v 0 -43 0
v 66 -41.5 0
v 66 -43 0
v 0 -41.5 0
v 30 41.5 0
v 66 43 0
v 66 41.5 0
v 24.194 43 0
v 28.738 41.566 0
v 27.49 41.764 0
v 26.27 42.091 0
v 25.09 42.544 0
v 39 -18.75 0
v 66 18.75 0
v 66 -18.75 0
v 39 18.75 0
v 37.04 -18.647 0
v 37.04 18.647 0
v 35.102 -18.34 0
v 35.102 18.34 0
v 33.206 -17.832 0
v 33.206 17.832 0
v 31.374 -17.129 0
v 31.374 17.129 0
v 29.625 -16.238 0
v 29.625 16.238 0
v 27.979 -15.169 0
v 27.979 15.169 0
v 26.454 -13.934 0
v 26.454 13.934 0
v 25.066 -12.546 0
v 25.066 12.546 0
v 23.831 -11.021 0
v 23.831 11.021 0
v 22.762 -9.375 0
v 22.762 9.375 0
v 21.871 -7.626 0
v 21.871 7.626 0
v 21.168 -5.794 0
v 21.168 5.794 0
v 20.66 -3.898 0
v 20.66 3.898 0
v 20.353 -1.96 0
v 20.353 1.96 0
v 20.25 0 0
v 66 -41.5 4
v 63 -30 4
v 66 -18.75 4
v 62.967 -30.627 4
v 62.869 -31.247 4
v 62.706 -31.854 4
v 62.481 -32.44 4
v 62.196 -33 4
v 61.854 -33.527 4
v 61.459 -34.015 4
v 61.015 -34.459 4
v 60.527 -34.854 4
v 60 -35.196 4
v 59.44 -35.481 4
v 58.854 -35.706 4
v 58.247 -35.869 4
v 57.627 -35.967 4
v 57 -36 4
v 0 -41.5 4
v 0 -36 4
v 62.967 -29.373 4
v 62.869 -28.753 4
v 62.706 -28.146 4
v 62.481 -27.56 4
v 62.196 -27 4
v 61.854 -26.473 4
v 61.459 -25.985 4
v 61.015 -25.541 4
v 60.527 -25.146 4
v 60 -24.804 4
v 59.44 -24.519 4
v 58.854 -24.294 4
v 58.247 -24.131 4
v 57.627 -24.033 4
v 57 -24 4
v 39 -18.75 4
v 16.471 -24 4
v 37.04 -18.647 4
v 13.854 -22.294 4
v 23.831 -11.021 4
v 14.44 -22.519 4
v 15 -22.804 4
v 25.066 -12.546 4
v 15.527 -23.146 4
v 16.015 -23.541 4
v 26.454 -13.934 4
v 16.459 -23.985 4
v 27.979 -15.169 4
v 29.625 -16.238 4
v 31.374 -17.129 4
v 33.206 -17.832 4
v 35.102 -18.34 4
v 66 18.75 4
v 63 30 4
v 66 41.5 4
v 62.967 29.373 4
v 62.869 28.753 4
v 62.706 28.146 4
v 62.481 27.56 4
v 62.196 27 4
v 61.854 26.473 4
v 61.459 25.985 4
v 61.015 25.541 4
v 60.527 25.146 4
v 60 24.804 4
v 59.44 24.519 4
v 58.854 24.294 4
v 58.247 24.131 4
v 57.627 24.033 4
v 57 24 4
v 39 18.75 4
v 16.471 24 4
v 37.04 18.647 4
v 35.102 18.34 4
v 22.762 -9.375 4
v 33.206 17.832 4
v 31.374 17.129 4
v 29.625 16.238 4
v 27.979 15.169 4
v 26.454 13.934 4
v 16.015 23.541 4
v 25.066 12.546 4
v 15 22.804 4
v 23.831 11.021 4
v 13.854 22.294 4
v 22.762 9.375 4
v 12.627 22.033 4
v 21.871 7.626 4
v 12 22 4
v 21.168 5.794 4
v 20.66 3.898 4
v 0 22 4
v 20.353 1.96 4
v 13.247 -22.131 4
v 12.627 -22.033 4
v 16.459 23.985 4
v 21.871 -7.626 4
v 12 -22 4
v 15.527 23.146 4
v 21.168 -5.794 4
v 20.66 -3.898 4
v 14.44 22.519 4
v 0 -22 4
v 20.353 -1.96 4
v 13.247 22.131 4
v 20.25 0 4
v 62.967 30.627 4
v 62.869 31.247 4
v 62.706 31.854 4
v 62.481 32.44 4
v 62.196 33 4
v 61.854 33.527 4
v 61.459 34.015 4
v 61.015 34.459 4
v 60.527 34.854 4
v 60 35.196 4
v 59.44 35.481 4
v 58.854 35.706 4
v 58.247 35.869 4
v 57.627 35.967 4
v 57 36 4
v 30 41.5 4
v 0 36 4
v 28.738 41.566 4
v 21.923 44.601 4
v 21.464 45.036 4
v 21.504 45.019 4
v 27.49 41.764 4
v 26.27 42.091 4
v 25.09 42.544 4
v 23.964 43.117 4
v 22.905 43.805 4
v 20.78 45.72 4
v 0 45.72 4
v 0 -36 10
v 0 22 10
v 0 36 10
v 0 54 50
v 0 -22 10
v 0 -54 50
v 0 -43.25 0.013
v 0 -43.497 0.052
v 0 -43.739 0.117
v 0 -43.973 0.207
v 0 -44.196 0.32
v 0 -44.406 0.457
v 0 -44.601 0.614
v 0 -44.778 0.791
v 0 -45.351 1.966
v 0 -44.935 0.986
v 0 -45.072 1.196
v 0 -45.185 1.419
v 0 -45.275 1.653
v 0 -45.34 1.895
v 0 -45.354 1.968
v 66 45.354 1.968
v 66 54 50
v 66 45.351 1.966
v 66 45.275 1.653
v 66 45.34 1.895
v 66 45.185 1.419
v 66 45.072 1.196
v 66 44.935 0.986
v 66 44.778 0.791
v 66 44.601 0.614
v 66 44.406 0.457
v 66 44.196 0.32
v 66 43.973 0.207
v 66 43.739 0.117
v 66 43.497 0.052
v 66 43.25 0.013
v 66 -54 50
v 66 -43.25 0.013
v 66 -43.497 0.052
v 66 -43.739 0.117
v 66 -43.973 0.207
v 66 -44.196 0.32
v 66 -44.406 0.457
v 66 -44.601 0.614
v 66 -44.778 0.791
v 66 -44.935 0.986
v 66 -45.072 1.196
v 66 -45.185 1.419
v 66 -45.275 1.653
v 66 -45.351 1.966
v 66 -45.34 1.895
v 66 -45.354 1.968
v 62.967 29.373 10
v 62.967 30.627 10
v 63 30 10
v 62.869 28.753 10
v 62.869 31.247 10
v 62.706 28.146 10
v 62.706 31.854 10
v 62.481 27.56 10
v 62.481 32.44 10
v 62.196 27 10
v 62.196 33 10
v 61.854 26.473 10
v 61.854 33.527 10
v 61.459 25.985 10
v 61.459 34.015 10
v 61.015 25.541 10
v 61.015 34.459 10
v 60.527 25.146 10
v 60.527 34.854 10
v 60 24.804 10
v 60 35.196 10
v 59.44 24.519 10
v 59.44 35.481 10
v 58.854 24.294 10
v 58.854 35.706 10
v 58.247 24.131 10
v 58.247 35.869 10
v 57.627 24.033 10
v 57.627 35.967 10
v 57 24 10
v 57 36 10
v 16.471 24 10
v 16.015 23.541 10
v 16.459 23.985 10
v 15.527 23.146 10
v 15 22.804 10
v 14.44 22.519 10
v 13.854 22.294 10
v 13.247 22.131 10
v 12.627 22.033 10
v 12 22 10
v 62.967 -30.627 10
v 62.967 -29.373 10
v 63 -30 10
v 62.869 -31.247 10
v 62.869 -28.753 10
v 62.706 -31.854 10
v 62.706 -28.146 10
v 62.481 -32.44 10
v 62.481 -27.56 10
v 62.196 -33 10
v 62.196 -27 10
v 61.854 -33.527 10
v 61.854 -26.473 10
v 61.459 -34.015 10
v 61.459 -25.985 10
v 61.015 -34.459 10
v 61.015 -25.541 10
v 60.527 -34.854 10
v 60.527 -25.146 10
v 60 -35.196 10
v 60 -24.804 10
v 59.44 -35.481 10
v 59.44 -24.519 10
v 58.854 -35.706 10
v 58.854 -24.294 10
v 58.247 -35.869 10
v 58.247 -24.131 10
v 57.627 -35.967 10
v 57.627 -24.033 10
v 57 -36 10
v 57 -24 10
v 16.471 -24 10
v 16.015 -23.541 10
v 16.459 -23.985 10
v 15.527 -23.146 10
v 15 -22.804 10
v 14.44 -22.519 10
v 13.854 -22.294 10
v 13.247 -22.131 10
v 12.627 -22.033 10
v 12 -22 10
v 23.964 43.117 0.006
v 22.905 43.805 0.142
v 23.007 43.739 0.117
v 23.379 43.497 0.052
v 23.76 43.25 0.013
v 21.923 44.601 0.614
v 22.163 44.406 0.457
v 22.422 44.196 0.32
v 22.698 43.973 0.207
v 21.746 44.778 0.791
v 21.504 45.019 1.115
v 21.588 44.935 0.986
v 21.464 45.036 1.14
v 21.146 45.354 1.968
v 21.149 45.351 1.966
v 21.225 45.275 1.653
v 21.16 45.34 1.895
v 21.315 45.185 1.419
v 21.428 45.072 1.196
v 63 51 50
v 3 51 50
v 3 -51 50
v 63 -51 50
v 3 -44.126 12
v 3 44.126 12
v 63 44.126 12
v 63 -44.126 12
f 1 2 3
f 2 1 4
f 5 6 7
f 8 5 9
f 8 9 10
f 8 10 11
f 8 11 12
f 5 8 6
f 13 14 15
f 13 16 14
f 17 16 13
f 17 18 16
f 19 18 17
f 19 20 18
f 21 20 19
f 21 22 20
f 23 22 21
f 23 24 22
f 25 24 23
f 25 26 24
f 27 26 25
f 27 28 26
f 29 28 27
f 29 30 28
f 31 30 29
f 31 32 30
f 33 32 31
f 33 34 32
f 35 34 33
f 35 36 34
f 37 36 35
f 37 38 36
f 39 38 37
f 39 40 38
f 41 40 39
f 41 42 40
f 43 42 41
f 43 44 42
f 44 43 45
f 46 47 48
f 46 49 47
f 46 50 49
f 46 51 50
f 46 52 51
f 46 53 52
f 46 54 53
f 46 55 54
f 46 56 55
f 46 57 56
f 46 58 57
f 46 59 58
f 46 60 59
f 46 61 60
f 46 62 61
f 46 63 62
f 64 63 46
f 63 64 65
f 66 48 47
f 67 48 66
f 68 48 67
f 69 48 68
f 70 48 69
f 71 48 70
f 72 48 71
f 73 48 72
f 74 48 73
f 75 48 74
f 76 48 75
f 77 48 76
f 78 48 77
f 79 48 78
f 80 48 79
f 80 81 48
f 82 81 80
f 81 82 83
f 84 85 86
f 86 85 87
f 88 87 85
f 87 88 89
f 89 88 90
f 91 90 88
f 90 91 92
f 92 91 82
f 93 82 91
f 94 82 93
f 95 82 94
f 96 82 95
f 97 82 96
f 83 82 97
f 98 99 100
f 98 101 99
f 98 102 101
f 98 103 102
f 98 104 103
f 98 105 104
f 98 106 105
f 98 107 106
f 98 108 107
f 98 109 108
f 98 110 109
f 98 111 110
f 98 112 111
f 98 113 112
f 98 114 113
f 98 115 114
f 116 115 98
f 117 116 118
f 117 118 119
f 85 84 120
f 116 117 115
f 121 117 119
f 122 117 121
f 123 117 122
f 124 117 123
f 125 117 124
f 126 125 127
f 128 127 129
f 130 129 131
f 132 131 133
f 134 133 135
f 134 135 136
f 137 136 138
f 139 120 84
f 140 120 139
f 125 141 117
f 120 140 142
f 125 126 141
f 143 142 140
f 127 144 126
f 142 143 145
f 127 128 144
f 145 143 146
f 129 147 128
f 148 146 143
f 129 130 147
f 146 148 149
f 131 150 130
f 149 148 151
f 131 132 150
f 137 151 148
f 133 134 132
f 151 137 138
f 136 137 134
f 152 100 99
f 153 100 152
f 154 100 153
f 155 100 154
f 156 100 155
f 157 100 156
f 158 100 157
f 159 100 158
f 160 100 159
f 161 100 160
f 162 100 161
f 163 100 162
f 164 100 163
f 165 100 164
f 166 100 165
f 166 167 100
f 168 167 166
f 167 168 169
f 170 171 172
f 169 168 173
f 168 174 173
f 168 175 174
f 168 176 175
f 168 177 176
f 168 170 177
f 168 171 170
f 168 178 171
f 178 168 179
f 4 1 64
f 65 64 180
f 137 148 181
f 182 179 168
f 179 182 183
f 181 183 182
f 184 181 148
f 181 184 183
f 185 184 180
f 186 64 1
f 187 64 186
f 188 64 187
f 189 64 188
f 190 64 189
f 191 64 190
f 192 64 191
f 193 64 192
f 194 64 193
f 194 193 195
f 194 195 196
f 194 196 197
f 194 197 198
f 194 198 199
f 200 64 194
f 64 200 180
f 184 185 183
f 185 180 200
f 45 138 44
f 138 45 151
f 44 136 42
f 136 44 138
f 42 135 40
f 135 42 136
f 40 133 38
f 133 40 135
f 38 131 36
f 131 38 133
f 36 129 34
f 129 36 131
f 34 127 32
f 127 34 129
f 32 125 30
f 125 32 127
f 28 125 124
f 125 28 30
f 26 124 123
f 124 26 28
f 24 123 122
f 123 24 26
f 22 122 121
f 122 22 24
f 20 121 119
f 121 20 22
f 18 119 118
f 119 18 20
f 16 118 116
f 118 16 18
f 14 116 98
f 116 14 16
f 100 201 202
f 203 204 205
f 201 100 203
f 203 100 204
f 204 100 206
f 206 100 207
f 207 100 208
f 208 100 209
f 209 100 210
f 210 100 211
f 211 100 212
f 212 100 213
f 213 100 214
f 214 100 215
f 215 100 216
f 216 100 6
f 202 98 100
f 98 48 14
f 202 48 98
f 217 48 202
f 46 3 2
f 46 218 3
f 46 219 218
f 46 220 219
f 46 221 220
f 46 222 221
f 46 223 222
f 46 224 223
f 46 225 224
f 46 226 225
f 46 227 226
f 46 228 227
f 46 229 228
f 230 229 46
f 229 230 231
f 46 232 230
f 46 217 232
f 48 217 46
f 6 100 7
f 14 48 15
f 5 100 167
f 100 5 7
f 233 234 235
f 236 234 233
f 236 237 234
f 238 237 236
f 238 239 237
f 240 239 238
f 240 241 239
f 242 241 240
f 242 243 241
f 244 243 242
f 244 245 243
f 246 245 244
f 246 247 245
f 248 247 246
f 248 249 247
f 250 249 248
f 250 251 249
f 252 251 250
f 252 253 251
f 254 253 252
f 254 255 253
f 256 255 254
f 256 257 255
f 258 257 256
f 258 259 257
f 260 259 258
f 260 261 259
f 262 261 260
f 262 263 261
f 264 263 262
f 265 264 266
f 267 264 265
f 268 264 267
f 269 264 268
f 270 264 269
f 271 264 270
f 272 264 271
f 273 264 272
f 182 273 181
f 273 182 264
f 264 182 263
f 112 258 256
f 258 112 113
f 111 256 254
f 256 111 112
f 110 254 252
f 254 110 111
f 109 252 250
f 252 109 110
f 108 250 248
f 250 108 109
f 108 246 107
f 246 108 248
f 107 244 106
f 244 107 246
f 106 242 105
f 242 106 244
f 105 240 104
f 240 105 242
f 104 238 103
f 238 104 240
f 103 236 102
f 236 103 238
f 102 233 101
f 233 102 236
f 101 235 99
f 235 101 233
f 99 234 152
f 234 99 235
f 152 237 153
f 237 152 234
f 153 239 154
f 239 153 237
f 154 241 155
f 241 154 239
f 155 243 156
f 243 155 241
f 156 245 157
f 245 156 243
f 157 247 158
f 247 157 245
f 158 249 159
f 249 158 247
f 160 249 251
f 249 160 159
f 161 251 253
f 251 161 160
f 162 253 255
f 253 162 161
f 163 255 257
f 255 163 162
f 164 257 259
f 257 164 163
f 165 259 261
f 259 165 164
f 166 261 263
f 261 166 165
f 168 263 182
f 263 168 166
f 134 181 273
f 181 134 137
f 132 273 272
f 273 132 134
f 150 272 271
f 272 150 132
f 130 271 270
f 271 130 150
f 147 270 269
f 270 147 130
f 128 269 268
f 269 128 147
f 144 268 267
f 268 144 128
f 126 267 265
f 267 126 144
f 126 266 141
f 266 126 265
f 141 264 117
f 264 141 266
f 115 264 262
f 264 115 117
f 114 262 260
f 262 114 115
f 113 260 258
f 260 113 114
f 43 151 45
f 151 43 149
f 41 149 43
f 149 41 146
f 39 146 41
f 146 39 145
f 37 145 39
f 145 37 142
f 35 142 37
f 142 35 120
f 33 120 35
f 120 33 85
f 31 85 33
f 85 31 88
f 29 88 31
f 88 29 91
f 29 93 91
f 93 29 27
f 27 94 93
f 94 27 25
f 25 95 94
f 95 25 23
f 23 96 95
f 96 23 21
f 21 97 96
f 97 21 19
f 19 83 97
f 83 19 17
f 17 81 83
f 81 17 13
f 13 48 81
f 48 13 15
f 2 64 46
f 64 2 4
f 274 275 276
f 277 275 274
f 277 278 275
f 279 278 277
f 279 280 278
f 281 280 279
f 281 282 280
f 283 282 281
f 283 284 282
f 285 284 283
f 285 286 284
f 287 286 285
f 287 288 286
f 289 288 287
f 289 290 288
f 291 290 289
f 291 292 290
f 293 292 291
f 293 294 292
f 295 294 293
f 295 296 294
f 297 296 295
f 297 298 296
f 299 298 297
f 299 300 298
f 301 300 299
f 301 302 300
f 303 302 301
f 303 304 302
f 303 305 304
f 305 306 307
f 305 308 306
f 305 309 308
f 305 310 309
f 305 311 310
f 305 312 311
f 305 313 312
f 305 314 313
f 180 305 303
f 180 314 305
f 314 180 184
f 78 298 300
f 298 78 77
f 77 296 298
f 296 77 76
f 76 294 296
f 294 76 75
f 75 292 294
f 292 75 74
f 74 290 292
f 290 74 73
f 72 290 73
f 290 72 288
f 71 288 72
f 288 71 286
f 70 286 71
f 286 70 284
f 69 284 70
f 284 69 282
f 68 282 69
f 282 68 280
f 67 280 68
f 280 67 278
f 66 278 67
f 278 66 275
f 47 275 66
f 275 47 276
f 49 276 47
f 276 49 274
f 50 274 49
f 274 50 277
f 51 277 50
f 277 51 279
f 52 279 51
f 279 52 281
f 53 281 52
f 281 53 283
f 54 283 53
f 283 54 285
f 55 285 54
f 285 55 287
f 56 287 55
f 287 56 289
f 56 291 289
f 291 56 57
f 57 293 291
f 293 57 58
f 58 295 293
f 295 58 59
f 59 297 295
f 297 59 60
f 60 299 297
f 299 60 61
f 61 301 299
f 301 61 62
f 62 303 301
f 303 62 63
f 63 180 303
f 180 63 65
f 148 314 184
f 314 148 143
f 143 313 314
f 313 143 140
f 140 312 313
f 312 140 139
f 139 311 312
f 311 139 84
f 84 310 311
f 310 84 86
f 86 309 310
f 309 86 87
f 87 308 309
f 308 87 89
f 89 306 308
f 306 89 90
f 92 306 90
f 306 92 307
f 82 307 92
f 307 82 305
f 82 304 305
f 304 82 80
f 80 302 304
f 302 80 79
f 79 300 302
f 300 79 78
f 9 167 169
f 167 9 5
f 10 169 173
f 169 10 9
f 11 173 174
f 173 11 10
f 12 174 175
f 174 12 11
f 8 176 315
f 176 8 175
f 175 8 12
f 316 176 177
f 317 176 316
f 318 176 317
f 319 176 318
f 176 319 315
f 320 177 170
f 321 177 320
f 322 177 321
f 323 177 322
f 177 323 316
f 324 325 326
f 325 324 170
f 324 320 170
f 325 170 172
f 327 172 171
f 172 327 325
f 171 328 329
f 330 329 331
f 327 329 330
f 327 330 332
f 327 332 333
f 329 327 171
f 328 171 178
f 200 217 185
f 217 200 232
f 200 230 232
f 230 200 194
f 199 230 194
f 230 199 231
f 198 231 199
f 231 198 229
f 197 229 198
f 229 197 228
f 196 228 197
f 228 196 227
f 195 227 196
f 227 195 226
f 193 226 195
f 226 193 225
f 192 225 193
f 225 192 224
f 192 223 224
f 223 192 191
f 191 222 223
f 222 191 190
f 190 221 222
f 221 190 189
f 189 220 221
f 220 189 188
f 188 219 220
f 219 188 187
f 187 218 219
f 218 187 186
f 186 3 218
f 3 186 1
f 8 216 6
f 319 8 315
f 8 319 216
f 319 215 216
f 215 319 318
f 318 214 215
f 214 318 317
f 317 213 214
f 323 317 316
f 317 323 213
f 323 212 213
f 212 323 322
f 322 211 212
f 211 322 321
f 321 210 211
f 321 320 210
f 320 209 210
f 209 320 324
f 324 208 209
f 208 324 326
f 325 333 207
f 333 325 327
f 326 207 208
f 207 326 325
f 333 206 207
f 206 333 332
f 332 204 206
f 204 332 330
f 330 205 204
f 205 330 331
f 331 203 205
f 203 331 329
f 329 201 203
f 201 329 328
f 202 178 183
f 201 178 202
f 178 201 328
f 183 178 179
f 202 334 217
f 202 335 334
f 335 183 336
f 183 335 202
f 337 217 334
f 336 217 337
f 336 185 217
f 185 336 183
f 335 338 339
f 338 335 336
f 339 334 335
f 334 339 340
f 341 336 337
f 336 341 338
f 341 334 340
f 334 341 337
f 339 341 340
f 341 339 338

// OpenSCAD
// file: utils.scad
// Private variables
HEIGHT = 50;

TOP_WIDTH_NO_FILLET = 108;
BOTTOM_WIDTH_NO_FILLET = 90;

TOP_FILLET_RADIUS = 5;
BOTTOM_FILLET_RADIUS = 2;


// Public prameters
function height() = HEIGHT;
function bottom_width_no_fillet() = BOTTOM_WIDTH_NO_FILLET;
function top_width_no_fillet() = TOP_WIDTH_NO_FILLET;
function bottom_fillet_radius() = BOTTOM_FILLET_RADIUS;
function top_fillet_radius() = TOP_FILLET_RADIUS;

function wall_angle() = 90+atan2((top_width_no_fillet()-bottom_width_no_fillet())/2, height());


inside_frame_profile();


module fillet(r, a=90) {
    p1 = [r,0];
    p2 = [sin(90-a)*r, sin(a)*r];
    dist = sqrt( pow(p2[0]-p1[0], 2) + pow(p2[1]-p1[1] ,2) );
    cr = (dist/2) / sin( (180-a)/2 );

    difference() {
        polygon([[0,0],p1,p2]);
        translate([r,cr]) circle(r=cr);
    }
}

module inside_frame_profile(offsets=[0,0,0]) {
          
    bottom_offset = offsets[0];
    top_offset = offsets[1];
    side_offset = offsets[2];

    right_bottom =  [bottom_offset,     -bottom_width_no_fillet()/2 + (sin(90-wall_angle())*bottom_offset) + side_offset];
    right_top =     [height()-top_offset, -top_width_no_fillet()/2    - (sin(90-wall_angle())*top_offset)    + side_offset];
    left_top =      [height()-top_offset,  top_width_no_fillet()/2    + (sin(90-wall_angle())*top_offset)    - side_offset];
    left_bottom =   [bottom_offset,      bottom_width_no_fillet()/2 - (sin(90-wall_angle())*bottom_offset) - side_offset];
    
    difference() {
        polygon([right_bottom, right_top, left_top, left_bottom]);
        translate([0,bottom_width_no_fillet()/2]) rotate([0,0,-90]) fillet(bottom_fillet_radius(), wall_angle(), $fn=60);
        translate([0,-bottom_width_no_fillet()/2]) rotate([0,0,-90]) mirror([1,0,0]) fillet(bottom_fillet_radius(), wall_angle(), $fn=60);
    }
}
// main file
use <utils.scad>;


WALL_THICKNESS = 3;


radio_box_assembly(length=66);



module radio_box_assembly(length) {
    box(length);
}


module box(length) {
    difference() {
        rotate([0,-90,180]) linear_extrude(length) inside_frame_profile(offsets=[0,0,0]);
        translate([WALL_THICKNESS, 0]) rotate([0,-90,180]) linear_extrude(length-WALL_THICKNESS*2) inside_frame_profile(offsets=[10+2,0,WALL_THICKNESS]);
        orange_bracket_cutout($fn=60);
    }
}


module orange_bracket_cutout() {
    union() {
        _orange_bracket_cutout();
        mirror ([0,1,0]) _orange_bracket_cutout();
    }
    
    // angled part
    translate([25, 83/2]) linear_extrude(4) {
        angle = 135;
        fillet(5, angle);
        polygon([
            [0,0],
            [-25, -tan(angle)*25],
            [-25,0]
        ]);
    }
}


module _orange_bracket_cutout() {
    
    // Bracket cutout
    linear_extrude(4) difference() {
        square([66, bottom_width_no_fillet()/2]);
        
        // Center hole cutout
        translate([39,0]) {
            circle(d=37.5);
            square([66-39, 37.5/2]);
        }
        
        // Cutout along the edge
        translate([0, bottom_width_no_fillet()/2-(bottom_width_no_fillet()-83)/2]) square([66, (bottom_width_no_fillet()-83)/2]);
    }
    
    // Screws cutout
    linear_extrude(10) {
        translate([57, 60/2]) circle(d=12);
        translate([0,60/2-12/2]) square([57, 12]);
        
        translate([12, 56/2]) circle(d=12);
        translate([0,56/2-12/2]) square([12, 12]);
    }
}
